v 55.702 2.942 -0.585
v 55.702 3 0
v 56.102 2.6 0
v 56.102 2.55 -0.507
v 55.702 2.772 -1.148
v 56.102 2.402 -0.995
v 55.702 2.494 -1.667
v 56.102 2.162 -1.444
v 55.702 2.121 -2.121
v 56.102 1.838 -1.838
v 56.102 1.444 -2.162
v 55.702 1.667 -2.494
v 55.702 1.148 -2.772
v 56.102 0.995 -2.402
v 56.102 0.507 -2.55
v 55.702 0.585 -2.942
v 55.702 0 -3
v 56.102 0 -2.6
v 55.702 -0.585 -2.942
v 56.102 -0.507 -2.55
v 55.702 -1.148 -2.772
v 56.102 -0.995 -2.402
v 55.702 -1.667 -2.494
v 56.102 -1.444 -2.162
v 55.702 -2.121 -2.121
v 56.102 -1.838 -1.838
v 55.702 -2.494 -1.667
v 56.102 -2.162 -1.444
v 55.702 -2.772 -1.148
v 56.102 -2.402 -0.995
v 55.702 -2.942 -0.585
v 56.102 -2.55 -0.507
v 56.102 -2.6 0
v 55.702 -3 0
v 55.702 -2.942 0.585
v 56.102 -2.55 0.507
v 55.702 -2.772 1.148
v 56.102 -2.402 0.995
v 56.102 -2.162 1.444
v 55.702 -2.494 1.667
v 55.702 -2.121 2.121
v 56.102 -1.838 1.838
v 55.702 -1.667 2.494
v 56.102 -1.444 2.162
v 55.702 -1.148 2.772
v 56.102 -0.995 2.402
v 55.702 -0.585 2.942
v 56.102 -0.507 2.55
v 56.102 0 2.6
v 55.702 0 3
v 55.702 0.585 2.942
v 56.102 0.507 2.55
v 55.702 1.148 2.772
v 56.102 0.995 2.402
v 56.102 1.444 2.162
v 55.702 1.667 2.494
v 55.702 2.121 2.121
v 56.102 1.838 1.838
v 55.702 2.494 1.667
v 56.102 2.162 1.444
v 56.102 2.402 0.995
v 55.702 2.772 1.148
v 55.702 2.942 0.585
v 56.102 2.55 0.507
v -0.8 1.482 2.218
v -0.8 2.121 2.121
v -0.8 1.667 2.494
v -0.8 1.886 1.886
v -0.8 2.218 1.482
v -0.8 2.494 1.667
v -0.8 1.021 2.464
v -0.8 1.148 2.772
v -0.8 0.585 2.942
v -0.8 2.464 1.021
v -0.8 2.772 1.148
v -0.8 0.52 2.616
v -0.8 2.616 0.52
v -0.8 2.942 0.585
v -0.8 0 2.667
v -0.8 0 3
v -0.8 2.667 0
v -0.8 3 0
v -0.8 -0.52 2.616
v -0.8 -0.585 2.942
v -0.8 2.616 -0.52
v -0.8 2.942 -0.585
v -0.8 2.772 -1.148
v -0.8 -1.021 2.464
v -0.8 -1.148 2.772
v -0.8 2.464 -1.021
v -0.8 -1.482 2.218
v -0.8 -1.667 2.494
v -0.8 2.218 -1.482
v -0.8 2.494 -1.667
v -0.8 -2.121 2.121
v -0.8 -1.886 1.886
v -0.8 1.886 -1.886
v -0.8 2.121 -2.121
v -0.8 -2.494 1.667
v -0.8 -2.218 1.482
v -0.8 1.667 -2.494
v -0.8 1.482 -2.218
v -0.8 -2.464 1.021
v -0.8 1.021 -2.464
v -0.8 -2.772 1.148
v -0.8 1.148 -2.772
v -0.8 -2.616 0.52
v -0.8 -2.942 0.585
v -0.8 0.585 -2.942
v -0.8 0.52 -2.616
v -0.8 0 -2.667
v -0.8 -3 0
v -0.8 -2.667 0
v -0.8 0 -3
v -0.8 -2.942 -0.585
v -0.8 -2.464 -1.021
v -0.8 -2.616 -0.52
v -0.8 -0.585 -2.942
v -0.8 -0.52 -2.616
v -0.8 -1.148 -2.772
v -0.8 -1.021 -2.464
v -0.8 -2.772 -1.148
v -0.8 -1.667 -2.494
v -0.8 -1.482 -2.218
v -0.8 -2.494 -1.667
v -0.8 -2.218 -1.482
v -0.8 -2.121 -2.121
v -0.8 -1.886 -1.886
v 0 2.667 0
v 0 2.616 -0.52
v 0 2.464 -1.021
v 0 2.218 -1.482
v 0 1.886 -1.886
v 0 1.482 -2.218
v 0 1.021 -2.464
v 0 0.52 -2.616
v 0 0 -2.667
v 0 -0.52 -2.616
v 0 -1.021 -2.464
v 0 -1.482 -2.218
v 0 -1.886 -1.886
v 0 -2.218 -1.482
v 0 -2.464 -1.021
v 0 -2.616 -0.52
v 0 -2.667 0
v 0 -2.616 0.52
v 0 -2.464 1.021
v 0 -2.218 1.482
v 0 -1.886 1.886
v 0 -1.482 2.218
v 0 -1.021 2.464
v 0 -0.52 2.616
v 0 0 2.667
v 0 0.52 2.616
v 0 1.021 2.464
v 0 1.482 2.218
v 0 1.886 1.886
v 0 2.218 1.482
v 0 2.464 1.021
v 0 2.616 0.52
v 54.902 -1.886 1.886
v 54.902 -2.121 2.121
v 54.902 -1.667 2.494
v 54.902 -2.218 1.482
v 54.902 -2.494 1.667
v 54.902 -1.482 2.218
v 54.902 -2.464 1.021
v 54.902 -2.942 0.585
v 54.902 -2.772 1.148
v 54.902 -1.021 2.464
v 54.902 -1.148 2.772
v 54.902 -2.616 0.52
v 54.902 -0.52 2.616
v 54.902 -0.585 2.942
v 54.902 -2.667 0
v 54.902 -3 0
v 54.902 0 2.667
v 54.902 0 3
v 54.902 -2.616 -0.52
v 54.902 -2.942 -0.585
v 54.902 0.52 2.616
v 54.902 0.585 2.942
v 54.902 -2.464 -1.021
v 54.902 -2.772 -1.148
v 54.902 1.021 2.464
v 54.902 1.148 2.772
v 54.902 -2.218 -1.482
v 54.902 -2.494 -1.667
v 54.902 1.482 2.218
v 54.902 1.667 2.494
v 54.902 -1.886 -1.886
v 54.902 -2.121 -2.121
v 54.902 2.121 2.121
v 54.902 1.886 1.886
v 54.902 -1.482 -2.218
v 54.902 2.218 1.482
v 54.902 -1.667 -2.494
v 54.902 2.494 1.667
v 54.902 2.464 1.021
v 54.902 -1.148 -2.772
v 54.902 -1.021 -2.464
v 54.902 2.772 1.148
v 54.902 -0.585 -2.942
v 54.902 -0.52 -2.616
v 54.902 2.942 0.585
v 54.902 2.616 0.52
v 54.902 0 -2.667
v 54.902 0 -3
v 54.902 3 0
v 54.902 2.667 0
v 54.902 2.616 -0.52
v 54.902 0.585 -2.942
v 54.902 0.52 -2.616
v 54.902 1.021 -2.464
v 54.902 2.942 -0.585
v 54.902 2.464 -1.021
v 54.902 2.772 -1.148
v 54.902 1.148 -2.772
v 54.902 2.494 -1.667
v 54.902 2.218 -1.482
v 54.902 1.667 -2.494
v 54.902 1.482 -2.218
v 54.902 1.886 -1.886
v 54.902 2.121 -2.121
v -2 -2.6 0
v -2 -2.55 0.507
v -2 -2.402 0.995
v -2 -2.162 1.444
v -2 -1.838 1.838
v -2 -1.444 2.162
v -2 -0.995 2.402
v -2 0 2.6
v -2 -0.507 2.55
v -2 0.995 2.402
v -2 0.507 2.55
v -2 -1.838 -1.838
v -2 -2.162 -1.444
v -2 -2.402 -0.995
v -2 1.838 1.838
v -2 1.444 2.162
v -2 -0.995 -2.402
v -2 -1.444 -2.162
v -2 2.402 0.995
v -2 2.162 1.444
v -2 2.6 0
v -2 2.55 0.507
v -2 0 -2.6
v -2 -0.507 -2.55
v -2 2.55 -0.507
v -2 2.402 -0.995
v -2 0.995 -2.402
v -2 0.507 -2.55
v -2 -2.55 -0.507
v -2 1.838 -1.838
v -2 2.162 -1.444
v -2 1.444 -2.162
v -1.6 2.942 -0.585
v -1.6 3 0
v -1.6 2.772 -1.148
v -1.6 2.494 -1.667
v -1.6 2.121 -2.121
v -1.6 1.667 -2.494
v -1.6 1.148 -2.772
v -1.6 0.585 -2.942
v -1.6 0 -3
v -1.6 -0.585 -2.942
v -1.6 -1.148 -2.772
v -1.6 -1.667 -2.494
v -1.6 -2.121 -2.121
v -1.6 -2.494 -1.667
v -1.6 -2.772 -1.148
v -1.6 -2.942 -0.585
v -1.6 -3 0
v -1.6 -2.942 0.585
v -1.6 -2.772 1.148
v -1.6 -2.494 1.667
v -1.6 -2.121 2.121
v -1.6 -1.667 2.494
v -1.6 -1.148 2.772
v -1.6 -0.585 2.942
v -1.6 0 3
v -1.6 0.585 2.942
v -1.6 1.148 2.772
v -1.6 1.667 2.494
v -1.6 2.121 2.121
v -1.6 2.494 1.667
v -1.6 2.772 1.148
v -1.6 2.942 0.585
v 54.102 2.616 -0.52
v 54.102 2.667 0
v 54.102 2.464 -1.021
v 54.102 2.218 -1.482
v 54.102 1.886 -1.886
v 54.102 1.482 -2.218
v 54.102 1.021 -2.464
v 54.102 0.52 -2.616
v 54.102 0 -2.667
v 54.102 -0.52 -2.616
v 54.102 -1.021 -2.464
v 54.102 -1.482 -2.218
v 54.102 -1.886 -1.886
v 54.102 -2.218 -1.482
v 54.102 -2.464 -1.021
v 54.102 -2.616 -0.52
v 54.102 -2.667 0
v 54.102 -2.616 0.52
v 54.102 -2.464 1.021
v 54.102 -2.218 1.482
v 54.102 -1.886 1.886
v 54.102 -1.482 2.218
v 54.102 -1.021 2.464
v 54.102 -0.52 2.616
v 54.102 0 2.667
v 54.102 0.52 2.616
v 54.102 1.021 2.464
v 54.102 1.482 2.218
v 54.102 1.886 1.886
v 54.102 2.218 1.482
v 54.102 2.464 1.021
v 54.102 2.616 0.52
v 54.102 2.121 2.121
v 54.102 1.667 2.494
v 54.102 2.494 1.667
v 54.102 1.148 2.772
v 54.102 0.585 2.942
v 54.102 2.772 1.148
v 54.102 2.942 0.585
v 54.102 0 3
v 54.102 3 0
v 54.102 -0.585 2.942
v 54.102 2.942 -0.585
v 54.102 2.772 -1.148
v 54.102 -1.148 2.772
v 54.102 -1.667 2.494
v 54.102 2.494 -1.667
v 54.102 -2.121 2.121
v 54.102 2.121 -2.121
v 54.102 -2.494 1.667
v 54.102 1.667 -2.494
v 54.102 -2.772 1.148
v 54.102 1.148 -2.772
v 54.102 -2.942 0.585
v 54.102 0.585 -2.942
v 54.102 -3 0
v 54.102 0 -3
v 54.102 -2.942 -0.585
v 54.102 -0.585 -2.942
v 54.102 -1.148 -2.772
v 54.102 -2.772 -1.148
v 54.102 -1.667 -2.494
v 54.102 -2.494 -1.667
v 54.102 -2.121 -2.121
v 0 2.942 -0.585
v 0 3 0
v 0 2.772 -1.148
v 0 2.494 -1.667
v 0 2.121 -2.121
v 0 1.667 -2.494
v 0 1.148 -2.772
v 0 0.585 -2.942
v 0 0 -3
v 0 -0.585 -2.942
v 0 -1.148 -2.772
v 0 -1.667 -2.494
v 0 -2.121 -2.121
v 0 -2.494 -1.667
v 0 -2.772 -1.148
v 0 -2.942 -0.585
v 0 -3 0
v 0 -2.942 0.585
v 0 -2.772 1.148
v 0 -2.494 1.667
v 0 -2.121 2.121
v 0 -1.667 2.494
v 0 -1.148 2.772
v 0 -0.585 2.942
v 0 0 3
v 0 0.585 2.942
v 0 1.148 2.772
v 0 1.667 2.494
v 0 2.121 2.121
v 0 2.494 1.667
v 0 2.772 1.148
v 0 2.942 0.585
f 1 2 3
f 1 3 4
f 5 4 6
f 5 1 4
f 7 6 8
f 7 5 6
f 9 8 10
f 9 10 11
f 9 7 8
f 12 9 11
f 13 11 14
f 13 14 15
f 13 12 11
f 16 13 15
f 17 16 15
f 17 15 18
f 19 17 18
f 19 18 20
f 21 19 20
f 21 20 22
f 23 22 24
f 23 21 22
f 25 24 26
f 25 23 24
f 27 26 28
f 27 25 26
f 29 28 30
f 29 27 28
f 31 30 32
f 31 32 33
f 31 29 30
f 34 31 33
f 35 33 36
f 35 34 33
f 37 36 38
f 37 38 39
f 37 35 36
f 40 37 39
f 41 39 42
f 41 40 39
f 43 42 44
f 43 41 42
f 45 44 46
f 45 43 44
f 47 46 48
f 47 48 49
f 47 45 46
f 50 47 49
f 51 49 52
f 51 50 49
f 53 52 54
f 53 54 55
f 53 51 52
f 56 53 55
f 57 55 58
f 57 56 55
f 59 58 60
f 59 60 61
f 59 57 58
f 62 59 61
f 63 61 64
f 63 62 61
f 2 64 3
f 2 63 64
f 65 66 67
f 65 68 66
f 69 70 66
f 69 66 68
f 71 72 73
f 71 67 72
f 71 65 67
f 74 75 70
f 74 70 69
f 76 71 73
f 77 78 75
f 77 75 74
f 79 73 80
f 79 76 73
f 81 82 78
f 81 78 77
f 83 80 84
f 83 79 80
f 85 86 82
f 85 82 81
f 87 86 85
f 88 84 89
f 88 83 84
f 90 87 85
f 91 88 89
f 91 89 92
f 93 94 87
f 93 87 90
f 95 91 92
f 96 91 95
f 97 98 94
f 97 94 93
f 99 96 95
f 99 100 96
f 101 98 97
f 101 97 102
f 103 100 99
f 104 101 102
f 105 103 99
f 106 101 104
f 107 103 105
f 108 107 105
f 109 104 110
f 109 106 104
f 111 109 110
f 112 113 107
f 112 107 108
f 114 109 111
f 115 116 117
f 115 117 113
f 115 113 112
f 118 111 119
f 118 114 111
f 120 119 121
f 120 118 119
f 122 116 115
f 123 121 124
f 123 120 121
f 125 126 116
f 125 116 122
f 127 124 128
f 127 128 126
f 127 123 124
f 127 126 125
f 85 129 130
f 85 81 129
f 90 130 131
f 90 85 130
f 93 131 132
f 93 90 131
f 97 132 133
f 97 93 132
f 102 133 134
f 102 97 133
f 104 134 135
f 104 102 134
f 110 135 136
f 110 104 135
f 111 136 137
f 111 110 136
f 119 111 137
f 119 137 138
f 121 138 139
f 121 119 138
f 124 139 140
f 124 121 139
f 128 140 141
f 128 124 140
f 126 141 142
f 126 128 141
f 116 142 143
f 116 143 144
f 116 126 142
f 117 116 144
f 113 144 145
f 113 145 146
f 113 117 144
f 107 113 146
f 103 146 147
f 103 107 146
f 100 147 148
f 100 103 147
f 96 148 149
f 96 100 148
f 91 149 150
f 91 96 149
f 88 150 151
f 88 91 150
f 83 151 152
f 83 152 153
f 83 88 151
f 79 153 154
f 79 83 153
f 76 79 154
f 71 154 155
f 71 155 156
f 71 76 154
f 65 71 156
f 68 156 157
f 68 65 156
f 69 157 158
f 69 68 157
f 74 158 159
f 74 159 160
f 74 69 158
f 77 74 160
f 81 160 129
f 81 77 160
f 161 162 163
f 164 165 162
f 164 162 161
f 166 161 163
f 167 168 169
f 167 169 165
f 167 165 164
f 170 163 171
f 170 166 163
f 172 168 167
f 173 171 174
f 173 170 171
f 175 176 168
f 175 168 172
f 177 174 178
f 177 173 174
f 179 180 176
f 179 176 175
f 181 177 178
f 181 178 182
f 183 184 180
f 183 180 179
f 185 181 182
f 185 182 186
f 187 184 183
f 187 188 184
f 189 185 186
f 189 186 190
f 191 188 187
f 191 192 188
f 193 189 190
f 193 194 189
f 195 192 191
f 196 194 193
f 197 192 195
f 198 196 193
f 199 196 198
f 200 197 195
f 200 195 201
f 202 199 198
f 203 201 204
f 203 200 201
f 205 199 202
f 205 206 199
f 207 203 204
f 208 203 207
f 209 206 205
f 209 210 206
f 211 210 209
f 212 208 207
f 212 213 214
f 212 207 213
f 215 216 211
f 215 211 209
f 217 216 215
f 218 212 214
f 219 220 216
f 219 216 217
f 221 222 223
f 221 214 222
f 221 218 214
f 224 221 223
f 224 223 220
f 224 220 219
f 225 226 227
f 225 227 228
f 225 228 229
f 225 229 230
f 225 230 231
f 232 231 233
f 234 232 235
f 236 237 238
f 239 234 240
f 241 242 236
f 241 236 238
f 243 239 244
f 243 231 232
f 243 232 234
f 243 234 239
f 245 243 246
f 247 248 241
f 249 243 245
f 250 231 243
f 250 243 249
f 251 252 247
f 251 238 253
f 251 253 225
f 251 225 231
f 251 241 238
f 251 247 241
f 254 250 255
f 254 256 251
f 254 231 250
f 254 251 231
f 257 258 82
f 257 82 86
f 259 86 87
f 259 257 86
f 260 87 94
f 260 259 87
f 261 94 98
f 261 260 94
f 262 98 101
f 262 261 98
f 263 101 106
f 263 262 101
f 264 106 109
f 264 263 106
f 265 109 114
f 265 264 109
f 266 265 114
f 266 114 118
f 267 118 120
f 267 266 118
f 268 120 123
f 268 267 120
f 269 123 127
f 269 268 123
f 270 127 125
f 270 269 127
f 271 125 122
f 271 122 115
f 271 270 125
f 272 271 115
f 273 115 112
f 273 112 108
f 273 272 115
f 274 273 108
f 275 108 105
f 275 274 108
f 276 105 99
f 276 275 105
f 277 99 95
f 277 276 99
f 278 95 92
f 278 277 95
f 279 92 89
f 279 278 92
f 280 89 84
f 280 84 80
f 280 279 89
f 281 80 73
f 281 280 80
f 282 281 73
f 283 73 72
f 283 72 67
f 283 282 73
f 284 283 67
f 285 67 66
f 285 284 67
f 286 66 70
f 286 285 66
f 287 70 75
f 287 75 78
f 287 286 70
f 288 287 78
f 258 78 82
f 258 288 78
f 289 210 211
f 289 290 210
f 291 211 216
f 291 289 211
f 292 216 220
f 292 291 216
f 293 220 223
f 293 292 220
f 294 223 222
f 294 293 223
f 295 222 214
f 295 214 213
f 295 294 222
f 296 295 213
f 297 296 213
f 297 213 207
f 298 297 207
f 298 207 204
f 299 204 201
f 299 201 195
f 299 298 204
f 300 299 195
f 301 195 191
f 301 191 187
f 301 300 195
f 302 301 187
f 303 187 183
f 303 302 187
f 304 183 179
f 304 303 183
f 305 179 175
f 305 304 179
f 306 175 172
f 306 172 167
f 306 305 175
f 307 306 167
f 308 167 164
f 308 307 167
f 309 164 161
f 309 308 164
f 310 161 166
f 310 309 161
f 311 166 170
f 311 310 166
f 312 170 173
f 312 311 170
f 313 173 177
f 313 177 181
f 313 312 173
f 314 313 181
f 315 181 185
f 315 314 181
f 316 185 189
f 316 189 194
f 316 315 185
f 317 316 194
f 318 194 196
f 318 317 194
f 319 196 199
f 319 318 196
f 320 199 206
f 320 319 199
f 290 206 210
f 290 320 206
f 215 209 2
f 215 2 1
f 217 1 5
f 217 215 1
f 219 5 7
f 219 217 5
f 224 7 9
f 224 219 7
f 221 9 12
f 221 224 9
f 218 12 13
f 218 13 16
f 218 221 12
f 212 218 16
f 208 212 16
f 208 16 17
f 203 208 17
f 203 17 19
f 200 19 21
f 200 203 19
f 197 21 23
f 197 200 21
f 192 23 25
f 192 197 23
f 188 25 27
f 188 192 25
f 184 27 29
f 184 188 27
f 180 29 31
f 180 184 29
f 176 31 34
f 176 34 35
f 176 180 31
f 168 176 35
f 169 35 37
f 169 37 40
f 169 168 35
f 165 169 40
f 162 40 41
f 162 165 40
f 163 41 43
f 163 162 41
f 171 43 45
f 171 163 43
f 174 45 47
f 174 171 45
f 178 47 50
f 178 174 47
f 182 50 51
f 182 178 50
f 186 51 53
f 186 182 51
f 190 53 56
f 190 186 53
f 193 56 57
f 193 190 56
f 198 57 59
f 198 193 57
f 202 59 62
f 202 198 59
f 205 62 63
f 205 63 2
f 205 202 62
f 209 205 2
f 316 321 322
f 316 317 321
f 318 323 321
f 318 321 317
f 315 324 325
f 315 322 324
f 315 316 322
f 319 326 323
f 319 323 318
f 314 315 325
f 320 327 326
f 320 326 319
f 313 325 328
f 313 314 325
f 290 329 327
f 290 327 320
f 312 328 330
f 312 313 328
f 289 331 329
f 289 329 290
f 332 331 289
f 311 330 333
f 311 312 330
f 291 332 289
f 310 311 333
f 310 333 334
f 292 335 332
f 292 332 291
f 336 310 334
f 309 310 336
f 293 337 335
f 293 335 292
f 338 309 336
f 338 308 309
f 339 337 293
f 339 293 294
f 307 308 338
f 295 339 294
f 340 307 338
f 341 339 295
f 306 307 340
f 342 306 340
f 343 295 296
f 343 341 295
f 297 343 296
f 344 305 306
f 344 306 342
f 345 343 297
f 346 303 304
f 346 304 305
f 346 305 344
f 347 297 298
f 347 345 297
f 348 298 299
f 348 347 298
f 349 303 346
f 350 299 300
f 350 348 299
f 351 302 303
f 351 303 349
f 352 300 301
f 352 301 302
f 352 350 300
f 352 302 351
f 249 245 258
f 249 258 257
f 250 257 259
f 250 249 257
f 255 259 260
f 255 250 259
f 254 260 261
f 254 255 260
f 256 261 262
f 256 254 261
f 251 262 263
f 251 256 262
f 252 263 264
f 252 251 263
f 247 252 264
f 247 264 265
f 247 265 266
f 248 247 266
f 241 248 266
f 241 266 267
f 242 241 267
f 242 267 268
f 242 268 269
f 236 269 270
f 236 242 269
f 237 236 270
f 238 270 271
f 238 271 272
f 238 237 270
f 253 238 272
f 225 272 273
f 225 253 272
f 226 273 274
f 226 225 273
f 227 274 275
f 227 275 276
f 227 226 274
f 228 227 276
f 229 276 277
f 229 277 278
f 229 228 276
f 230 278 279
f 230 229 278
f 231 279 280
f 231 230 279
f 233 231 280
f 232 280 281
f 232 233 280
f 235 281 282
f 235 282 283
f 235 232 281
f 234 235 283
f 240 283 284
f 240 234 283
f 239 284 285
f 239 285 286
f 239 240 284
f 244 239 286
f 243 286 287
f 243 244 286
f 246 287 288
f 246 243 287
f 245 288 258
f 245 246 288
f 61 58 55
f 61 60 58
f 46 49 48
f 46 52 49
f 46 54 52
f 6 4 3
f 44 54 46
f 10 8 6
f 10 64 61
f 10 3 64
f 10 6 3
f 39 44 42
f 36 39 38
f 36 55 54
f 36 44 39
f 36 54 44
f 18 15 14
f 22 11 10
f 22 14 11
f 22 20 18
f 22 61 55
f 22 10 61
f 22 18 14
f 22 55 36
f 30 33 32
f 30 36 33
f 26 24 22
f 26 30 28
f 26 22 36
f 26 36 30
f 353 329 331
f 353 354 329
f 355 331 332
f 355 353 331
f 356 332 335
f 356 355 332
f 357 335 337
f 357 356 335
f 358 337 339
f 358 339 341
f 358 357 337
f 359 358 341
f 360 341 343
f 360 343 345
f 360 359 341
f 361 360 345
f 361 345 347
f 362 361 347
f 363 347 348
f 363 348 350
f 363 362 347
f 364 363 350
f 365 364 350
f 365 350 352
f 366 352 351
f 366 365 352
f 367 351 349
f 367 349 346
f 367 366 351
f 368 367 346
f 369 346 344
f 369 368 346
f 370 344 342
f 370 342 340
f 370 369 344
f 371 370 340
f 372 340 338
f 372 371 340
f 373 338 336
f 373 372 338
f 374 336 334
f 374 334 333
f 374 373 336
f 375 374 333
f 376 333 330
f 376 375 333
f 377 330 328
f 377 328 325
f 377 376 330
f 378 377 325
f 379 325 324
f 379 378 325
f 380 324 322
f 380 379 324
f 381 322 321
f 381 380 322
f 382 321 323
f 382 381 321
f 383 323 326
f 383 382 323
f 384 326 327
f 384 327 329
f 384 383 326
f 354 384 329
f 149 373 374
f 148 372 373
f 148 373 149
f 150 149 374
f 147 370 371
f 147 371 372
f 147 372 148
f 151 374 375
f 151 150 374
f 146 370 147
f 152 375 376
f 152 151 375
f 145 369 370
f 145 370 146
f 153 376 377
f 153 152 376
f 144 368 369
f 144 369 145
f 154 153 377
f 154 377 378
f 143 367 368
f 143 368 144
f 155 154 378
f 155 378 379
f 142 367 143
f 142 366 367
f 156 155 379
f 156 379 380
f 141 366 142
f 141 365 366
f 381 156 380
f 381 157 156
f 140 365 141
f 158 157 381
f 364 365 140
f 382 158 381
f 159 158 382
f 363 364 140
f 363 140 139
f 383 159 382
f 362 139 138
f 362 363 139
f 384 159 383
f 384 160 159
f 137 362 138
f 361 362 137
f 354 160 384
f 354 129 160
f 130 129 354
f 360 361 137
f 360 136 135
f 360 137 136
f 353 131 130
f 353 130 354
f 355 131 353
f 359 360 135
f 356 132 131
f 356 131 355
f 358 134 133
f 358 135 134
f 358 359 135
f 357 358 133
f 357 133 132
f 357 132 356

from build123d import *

# Parameters (mm, degrees)
CHAMFER1_SIZE = 0.4


with BuildPart() as part:
    # Sketch1 → Revolve1 (revolve)
    with BuildSketch(Plane.XY):
        Polygon((-2, 0), (56.102, 0), (56.102, 3), (54.902, 3), (54.902, 2.667), (54.102, 2.667), (54.102, 3), (0, 3), (0, 2.667), (-0.8, 2.667), (-0.8, 3), (-2, 3), align=None)
    revolve(axis=Axis((-2, 0, 0), (-1, 0, 0)))

    # Chamfer1
    chamfer1_edges = [part.edges().sort_by_distance(p)[0] for p in [
        (-2, -3, 0),
        (56.102, -3, 0),
    ]]
    chamfer(chamfer1_edges, length=CHAMFER1_SIZE)


solid = part.part
